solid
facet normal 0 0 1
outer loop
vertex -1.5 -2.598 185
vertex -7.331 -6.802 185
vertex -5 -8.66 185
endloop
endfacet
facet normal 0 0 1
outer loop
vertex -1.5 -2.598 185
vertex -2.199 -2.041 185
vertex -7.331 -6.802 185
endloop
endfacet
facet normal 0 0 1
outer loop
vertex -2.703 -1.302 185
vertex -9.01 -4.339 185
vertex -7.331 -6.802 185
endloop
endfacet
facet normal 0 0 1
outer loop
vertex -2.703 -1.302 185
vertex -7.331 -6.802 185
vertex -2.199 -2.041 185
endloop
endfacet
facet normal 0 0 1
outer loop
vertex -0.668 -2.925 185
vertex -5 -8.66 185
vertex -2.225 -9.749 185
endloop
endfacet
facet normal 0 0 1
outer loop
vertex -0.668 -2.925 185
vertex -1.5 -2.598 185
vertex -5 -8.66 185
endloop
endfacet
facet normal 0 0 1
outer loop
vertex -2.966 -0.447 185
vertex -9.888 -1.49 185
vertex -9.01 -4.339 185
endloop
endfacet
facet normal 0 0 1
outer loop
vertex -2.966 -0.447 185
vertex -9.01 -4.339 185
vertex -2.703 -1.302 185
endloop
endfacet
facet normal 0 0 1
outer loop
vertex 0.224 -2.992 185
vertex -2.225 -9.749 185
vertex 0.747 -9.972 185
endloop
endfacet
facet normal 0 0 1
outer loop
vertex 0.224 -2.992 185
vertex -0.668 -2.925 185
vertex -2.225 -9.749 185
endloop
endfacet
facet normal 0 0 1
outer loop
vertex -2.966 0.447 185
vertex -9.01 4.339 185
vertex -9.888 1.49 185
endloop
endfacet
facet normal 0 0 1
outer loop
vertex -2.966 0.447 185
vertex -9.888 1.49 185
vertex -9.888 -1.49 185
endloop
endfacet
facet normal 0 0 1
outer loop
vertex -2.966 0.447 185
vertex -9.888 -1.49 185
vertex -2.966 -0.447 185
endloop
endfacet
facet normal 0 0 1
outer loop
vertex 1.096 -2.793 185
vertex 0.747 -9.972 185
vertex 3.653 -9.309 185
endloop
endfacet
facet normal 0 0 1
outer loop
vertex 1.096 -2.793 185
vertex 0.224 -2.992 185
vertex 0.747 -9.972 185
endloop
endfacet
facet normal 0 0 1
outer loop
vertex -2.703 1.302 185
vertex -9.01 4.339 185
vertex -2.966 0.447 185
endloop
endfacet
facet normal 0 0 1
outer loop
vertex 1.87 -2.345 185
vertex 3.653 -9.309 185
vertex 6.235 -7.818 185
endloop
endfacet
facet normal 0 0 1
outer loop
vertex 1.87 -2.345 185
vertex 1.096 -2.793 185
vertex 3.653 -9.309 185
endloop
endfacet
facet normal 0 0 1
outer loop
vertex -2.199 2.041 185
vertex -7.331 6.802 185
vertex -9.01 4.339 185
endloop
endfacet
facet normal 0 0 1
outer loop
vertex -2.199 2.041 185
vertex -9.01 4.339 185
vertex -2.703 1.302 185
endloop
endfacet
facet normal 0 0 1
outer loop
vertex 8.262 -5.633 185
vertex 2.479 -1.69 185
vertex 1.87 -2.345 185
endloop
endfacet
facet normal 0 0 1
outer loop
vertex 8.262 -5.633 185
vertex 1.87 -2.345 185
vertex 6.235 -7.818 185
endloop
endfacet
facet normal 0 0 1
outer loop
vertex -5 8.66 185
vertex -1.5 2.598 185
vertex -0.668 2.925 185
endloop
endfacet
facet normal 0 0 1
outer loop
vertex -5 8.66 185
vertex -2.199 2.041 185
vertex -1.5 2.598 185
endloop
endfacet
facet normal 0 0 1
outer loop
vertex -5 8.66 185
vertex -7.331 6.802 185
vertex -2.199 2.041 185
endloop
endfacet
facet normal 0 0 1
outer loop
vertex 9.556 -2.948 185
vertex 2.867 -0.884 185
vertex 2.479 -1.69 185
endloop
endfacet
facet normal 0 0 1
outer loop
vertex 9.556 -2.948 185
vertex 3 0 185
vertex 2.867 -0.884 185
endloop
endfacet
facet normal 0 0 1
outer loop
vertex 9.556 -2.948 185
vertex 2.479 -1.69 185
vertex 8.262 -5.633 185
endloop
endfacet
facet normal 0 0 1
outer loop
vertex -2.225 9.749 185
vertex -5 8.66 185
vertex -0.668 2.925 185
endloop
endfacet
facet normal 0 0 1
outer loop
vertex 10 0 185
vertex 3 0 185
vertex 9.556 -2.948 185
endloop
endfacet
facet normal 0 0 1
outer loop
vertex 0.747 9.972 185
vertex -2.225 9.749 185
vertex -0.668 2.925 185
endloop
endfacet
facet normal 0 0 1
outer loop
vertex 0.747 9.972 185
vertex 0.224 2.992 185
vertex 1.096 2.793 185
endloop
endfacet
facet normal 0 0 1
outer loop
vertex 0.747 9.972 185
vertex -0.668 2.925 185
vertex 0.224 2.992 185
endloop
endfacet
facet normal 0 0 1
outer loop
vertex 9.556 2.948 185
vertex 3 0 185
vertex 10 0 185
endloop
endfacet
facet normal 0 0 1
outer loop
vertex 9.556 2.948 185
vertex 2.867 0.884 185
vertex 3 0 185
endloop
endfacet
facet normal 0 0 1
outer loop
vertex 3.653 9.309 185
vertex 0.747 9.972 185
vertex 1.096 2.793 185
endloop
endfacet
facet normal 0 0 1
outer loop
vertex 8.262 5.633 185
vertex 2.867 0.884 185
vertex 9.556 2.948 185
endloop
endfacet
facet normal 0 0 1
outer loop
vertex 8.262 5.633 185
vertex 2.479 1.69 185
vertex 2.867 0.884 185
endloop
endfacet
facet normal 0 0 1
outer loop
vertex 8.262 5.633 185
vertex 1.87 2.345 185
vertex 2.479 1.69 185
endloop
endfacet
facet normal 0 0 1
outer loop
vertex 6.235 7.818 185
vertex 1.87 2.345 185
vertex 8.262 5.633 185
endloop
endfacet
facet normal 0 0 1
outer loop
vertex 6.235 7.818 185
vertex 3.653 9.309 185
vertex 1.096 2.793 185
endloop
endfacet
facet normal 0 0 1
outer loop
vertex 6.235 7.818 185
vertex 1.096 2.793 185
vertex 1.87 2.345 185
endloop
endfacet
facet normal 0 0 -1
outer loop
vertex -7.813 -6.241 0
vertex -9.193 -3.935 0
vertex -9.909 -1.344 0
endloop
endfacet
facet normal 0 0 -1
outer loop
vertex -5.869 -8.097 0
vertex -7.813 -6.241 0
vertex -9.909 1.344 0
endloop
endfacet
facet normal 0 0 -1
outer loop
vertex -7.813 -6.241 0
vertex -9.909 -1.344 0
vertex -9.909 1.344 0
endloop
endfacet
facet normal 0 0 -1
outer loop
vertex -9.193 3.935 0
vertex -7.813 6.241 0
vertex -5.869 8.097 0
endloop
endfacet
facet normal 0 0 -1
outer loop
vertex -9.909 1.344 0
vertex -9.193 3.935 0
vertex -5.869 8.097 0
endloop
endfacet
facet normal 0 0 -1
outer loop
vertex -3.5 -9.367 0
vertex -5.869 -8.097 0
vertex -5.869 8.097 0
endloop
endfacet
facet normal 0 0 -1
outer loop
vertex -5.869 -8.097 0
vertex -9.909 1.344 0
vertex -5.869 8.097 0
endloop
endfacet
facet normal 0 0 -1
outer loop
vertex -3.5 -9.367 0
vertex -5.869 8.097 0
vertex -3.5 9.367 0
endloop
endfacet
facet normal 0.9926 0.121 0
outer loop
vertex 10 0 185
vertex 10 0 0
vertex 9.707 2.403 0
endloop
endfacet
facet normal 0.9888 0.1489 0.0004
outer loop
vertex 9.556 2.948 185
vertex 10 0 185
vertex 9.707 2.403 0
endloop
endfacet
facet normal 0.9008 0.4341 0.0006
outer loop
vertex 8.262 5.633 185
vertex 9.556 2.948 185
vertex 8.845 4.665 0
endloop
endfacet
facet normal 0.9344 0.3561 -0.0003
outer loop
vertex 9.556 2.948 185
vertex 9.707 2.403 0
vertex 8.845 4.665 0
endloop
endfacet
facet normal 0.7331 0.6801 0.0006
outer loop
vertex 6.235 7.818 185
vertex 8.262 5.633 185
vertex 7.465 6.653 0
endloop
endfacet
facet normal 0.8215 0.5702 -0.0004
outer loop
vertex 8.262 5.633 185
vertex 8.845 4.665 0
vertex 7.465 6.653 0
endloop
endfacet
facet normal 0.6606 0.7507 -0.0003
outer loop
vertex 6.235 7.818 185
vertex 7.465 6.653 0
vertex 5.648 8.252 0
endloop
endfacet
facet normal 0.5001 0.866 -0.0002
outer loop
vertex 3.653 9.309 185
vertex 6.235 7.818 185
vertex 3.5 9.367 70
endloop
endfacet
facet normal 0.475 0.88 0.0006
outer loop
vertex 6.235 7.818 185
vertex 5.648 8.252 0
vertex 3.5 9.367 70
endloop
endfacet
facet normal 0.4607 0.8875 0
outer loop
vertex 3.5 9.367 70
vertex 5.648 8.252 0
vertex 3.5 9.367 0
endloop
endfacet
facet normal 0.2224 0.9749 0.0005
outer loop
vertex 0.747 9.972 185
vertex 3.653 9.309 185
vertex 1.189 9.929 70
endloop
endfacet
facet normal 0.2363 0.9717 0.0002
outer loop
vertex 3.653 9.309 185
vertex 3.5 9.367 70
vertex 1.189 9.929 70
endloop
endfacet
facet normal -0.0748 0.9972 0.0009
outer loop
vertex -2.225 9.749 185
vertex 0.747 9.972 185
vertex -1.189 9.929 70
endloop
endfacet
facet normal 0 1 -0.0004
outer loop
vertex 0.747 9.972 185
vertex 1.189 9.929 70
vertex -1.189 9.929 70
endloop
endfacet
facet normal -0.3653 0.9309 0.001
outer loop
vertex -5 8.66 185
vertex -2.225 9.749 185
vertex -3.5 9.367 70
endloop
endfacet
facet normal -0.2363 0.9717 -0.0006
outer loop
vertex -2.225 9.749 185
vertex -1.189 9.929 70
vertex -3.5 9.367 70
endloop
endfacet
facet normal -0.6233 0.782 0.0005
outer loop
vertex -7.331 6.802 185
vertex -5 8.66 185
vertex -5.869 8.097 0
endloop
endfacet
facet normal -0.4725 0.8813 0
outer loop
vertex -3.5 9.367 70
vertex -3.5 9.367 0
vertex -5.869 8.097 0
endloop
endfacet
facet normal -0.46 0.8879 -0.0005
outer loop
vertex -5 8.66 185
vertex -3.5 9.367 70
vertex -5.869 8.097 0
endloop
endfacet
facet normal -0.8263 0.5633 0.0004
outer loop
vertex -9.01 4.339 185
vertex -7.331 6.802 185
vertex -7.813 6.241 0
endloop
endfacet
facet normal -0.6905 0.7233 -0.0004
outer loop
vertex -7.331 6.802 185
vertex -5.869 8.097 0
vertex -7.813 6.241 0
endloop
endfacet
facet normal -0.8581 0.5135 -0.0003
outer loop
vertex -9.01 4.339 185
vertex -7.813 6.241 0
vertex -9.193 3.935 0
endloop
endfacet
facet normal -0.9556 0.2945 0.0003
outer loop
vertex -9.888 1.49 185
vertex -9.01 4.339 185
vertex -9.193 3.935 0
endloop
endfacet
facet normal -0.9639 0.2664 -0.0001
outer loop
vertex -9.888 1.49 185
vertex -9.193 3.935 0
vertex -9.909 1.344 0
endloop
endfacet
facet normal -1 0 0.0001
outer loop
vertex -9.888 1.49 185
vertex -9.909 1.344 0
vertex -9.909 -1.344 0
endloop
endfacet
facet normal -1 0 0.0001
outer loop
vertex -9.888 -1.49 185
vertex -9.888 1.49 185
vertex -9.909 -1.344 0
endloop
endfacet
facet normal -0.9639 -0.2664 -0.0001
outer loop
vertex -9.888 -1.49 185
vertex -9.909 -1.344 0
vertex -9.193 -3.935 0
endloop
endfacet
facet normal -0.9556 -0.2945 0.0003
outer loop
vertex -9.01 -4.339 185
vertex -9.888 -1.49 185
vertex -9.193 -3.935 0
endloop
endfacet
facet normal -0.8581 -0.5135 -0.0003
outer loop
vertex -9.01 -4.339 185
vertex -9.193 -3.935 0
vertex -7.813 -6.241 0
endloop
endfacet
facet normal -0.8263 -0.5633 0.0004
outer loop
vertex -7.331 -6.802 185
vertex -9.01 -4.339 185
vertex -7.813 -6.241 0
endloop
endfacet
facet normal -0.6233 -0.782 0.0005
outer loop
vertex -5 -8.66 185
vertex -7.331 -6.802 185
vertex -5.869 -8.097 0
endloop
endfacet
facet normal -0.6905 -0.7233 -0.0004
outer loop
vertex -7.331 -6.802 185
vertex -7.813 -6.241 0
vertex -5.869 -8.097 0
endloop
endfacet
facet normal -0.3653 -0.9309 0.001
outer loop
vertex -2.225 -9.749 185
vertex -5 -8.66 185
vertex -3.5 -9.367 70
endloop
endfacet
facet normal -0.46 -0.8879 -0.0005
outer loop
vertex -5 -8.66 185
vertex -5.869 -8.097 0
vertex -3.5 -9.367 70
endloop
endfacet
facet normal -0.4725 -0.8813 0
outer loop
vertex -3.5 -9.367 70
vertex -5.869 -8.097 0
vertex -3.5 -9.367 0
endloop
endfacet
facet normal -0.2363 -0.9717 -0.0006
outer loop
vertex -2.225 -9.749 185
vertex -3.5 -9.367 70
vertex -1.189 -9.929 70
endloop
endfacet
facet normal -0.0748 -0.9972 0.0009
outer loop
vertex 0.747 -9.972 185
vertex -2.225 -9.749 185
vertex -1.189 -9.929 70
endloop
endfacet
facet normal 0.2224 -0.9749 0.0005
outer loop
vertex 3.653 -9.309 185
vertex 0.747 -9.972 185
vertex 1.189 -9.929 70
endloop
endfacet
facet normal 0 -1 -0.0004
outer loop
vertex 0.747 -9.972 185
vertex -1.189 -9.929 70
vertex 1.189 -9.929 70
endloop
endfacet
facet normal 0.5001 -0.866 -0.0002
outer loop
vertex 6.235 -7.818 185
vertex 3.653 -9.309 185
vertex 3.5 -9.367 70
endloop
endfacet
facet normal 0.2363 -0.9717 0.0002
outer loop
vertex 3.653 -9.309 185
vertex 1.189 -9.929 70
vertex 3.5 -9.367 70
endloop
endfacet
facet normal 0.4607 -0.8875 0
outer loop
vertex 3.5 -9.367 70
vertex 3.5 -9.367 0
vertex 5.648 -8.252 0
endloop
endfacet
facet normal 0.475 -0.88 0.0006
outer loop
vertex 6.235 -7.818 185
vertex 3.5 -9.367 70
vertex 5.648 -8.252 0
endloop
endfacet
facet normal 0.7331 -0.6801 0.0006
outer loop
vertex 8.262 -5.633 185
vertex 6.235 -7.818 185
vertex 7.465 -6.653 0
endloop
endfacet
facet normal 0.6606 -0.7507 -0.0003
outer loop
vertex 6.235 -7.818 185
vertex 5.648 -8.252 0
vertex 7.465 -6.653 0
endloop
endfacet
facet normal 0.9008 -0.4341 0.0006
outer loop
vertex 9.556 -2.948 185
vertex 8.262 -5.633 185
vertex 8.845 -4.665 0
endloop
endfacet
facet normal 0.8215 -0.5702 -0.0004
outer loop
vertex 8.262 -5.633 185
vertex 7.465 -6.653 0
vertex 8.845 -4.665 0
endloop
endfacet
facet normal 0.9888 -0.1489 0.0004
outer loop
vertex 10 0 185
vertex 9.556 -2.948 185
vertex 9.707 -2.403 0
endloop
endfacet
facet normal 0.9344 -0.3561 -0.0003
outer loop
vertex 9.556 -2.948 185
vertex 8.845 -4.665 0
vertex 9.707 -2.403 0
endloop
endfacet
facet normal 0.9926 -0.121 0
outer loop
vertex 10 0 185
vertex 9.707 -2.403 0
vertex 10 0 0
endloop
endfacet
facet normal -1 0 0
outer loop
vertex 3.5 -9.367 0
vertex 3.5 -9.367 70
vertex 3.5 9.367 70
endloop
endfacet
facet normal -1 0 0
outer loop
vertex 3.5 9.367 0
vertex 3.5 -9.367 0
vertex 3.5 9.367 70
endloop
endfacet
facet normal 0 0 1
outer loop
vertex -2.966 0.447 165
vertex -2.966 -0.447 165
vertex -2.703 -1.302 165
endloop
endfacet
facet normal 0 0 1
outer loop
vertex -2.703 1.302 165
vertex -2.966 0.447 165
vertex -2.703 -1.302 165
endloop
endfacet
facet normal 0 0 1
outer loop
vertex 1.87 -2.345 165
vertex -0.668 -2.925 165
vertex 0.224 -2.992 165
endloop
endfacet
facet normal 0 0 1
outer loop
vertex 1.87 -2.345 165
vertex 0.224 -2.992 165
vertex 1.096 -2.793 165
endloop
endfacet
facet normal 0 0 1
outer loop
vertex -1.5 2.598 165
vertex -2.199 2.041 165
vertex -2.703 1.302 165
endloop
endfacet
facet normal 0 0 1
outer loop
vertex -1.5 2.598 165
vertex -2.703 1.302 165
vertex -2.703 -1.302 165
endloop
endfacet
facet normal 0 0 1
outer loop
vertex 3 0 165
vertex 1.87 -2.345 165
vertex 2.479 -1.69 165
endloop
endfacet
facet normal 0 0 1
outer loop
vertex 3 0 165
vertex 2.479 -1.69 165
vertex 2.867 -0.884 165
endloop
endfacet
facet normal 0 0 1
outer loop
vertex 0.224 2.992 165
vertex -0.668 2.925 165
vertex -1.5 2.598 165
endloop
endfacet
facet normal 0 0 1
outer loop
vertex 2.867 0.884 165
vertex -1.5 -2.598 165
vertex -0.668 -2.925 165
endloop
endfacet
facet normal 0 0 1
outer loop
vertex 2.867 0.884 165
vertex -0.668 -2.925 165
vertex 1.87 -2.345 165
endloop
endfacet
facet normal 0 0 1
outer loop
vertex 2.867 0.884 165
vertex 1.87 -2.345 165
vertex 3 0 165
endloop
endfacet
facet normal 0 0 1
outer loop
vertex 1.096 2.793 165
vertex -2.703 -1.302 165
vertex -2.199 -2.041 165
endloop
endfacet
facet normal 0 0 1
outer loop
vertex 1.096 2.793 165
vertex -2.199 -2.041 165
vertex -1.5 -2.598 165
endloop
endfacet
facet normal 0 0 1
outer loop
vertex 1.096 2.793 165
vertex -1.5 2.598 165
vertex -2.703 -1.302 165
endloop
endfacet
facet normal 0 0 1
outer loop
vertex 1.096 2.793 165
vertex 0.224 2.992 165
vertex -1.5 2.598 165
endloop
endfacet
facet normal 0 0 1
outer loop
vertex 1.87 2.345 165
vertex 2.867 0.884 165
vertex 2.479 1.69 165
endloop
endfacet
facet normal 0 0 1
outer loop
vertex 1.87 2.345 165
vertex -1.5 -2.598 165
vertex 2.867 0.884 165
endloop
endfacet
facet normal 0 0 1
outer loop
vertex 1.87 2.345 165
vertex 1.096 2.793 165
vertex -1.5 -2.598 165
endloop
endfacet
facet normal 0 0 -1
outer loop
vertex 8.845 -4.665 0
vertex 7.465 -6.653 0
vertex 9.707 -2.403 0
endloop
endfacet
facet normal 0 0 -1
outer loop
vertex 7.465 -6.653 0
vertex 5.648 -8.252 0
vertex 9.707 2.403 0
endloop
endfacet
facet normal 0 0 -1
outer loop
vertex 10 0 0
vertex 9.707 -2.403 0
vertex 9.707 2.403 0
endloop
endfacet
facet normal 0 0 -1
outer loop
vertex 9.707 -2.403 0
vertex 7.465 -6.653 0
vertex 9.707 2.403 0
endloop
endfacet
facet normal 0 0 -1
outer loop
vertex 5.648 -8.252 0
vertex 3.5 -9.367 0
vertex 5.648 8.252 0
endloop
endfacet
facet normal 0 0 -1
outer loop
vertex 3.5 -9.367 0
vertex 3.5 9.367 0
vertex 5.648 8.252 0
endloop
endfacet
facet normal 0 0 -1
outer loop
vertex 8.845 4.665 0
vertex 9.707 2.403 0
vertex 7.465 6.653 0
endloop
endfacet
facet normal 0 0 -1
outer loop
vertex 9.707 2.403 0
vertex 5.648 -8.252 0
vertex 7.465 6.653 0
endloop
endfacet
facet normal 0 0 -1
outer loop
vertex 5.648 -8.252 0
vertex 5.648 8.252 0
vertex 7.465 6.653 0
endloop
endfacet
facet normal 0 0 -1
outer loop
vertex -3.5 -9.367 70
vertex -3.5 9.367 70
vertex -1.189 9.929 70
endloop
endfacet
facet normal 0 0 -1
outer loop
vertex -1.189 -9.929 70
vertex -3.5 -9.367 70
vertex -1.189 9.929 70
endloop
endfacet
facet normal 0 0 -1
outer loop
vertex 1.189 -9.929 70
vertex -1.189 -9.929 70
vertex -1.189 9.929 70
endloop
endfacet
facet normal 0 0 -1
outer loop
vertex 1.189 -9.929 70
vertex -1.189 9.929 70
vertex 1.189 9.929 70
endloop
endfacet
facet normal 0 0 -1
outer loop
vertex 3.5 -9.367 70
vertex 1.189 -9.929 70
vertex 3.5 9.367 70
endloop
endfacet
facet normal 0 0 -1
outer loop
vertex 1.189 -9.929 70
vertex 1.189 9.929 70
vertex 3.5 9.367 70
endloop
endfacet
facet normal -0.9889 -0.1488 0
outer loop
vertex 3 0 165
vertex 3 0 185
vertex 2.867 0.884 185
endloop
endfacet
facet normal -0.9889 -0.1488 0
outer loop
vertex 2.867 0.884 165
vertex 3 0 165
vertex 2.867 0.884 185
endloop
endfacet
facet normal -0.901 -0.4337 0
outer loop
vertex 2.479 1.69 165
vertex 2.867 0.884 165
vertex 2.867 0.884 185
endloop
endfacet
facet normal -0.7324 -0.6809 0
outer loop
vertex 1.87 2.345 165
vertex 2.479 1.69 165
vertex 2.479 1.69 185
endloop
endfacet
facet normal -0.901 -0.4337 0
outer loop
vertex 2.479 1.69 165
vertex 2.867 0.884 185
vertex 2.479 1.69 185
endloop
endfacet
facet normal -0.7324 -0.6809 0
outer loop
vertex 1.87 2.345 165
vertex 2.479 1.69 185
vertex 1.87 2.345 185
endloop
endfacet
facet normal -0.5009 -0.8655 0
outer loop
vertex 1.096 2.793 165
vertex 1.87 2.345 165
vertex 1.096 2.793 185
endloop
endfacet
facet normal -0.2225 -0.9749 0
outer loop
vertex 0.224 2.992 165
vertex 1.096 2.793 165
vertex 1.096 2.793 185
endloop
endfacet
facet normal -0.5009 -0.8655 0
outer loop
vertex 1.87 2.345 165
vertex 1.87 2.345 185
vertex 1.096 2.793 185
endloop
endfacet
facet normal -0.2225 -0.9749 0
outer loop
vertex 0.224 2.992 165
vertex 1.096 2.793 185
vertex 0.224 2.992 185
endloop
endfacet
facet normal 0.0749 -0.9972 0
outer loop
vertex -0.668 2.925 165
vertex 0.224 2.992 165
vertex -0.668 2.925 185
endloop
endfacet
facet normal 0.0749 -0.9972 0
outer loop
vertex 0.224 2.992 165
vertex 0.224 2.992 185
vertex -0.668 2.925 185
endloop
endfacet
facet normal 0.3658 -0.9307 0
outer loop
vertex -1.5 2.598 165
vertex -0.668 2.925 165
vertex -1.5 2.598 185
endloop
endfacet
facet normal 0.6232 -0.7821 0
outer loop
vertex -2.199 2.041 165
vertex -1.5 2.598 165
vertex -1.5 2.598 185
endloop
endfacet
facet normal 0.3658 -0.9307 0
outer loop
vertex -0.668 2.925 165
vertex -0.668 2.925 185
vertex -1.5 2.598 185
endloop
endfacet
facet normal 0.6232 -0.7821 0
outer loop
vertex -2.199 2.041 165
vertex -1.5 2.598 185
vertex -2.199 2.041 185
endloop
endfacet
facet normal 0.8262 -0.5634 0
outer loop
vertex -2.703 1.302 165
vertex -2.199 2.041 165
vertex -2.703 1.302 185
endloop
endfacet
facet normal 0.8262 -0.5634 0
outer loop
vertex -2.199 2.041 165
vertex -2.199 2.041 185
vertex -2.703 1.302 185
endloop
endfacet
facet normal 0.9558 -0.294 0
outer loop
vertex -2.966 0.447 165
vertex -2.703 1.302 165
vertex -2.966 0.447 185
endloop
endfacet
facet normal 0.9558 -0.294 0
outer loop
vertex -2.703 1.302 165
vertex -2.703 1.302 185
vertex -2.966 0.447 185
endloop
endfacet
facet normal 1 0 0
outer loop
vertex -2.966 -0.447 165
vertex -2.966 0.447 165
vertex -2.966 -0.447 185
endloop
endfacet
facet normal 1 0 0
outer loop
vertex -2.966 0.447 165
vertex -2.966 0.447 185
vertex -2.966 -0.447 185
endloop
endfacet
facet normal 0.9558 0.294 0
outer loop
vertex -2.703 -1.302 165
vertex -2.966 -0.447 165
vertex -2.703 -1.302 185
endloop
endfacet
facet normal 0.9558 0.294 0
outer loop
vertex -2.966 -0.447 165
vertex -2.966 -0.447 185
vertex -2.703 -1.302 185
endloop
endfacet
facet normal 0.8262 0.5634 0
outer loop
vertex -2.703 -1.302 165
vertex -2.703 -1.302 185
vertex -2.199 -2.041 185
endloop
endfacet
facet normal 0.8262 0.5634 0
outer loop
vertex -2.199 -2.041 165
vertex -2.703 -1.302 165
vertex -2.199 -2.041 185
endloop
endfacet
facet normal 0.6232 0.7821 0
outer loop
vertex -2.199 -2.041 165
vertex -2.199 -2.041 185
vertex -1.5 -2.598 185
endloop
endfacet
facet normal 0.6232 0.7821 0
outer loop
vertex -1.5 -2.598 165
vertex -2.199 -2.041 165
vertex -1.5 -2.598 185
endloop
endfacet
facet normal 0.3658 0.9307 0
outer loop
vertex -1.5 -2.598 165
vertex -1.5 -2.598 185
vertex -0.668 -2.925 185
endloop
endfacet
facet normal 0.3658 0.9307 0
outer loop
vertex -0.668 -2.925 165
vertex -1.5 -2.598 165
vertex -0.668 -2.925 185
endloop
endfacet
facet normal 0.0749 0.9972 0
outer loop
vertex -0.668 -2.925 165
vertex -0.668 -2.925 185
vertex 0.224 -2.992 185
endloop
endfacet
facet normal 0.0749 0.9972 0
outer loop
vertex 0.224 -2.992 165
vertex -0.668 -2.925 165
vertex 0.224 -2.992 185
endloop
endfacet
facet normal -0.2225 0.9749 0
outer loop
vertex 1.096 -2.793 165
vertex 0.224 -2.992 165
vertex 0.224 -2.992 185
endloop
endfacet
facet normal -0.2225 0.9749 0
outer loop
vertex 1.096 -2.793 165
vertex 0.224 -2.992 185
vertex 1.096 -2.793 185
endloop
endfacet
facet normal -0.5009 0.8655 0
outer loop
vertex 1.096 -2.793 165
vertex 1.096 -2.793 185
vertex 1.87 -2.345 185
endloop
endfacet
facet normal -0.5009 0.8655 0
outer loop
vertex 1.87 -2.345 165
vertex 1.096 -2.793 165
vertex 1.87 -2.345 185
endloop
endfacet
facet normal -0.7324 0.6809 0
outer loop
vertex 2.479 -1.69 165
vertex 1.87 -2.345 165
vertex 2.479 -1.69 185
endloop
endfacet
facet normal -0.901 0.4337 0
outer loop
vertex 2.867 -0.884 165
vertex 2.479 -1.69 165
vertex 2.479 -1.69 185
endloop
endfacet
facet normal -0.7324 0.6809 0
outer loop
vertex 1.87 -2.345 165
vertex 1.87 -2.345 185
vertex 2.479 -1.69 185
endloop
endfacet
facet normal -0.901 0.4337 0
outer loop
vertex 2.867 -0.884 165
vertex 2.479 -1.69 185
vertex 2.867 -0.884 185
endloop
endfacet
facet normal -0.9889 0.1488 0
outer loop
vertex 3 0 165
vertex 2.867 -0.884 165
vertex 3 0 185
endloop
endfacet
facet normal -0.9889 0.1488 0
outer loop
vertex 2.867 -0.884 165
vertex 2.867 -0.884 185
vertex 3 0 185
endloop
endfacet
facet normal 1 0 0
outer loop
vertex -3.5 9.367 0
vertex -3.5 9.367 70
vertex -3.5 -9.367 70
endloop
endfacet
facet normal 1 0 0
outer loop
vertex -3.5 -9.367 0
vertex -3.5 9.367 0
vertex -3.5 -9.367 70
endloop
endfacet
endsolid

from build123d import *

# Parameters (mm, degrees)
SKETCH1_R           = 10
BOSS_EXTRUDE1_DEPTH = 185
CUT_EXTRUDE1_DEPTH  = 70
SKETCH3_R           = 3
CUT_EXTRUDE2_DEPTH  = 20


with BuildPart() as part:
    # Sketch1 → Boss-Extrude1 (new body)
    with BuildSketch(Plane.XY):
        Circle(SKETCH1_R)
    extrude(amount=BOSS_EXTRUDE1_DEPTH)

    # Sketch1<3> → Cut-Extrude1 (cut)
    with BuildSketch(Plane.XY):
        with BuildLine():
            Line((3.5, -9.367496998), (3.5, 9.367496998))
            ThreePointArc((3.5, 9.367496998), (0, 10), (-3.5, 9.367496998))
            Line((-3.5, 9.367496998), (-3.5, -9.367496998))
            ThreePointArc((-3.5, -9.367496998), (0, -10), (3.5, -9.367496998))
        make_face()
    extrude(amount=CUT_EXTRUDE1_DEPTH, mode=Mode.SUBTRACT)

    # Sketch3 → Cut-Extrude2 (cut)
    with BuildSketch(Plane.XY.offset(185)):
        Circle(SKETCH3_R)
    extrude(amount=-CUT_EXTRUDE2_DEPTH, mode=Mode.SUBTRACT)


solid = part.part
